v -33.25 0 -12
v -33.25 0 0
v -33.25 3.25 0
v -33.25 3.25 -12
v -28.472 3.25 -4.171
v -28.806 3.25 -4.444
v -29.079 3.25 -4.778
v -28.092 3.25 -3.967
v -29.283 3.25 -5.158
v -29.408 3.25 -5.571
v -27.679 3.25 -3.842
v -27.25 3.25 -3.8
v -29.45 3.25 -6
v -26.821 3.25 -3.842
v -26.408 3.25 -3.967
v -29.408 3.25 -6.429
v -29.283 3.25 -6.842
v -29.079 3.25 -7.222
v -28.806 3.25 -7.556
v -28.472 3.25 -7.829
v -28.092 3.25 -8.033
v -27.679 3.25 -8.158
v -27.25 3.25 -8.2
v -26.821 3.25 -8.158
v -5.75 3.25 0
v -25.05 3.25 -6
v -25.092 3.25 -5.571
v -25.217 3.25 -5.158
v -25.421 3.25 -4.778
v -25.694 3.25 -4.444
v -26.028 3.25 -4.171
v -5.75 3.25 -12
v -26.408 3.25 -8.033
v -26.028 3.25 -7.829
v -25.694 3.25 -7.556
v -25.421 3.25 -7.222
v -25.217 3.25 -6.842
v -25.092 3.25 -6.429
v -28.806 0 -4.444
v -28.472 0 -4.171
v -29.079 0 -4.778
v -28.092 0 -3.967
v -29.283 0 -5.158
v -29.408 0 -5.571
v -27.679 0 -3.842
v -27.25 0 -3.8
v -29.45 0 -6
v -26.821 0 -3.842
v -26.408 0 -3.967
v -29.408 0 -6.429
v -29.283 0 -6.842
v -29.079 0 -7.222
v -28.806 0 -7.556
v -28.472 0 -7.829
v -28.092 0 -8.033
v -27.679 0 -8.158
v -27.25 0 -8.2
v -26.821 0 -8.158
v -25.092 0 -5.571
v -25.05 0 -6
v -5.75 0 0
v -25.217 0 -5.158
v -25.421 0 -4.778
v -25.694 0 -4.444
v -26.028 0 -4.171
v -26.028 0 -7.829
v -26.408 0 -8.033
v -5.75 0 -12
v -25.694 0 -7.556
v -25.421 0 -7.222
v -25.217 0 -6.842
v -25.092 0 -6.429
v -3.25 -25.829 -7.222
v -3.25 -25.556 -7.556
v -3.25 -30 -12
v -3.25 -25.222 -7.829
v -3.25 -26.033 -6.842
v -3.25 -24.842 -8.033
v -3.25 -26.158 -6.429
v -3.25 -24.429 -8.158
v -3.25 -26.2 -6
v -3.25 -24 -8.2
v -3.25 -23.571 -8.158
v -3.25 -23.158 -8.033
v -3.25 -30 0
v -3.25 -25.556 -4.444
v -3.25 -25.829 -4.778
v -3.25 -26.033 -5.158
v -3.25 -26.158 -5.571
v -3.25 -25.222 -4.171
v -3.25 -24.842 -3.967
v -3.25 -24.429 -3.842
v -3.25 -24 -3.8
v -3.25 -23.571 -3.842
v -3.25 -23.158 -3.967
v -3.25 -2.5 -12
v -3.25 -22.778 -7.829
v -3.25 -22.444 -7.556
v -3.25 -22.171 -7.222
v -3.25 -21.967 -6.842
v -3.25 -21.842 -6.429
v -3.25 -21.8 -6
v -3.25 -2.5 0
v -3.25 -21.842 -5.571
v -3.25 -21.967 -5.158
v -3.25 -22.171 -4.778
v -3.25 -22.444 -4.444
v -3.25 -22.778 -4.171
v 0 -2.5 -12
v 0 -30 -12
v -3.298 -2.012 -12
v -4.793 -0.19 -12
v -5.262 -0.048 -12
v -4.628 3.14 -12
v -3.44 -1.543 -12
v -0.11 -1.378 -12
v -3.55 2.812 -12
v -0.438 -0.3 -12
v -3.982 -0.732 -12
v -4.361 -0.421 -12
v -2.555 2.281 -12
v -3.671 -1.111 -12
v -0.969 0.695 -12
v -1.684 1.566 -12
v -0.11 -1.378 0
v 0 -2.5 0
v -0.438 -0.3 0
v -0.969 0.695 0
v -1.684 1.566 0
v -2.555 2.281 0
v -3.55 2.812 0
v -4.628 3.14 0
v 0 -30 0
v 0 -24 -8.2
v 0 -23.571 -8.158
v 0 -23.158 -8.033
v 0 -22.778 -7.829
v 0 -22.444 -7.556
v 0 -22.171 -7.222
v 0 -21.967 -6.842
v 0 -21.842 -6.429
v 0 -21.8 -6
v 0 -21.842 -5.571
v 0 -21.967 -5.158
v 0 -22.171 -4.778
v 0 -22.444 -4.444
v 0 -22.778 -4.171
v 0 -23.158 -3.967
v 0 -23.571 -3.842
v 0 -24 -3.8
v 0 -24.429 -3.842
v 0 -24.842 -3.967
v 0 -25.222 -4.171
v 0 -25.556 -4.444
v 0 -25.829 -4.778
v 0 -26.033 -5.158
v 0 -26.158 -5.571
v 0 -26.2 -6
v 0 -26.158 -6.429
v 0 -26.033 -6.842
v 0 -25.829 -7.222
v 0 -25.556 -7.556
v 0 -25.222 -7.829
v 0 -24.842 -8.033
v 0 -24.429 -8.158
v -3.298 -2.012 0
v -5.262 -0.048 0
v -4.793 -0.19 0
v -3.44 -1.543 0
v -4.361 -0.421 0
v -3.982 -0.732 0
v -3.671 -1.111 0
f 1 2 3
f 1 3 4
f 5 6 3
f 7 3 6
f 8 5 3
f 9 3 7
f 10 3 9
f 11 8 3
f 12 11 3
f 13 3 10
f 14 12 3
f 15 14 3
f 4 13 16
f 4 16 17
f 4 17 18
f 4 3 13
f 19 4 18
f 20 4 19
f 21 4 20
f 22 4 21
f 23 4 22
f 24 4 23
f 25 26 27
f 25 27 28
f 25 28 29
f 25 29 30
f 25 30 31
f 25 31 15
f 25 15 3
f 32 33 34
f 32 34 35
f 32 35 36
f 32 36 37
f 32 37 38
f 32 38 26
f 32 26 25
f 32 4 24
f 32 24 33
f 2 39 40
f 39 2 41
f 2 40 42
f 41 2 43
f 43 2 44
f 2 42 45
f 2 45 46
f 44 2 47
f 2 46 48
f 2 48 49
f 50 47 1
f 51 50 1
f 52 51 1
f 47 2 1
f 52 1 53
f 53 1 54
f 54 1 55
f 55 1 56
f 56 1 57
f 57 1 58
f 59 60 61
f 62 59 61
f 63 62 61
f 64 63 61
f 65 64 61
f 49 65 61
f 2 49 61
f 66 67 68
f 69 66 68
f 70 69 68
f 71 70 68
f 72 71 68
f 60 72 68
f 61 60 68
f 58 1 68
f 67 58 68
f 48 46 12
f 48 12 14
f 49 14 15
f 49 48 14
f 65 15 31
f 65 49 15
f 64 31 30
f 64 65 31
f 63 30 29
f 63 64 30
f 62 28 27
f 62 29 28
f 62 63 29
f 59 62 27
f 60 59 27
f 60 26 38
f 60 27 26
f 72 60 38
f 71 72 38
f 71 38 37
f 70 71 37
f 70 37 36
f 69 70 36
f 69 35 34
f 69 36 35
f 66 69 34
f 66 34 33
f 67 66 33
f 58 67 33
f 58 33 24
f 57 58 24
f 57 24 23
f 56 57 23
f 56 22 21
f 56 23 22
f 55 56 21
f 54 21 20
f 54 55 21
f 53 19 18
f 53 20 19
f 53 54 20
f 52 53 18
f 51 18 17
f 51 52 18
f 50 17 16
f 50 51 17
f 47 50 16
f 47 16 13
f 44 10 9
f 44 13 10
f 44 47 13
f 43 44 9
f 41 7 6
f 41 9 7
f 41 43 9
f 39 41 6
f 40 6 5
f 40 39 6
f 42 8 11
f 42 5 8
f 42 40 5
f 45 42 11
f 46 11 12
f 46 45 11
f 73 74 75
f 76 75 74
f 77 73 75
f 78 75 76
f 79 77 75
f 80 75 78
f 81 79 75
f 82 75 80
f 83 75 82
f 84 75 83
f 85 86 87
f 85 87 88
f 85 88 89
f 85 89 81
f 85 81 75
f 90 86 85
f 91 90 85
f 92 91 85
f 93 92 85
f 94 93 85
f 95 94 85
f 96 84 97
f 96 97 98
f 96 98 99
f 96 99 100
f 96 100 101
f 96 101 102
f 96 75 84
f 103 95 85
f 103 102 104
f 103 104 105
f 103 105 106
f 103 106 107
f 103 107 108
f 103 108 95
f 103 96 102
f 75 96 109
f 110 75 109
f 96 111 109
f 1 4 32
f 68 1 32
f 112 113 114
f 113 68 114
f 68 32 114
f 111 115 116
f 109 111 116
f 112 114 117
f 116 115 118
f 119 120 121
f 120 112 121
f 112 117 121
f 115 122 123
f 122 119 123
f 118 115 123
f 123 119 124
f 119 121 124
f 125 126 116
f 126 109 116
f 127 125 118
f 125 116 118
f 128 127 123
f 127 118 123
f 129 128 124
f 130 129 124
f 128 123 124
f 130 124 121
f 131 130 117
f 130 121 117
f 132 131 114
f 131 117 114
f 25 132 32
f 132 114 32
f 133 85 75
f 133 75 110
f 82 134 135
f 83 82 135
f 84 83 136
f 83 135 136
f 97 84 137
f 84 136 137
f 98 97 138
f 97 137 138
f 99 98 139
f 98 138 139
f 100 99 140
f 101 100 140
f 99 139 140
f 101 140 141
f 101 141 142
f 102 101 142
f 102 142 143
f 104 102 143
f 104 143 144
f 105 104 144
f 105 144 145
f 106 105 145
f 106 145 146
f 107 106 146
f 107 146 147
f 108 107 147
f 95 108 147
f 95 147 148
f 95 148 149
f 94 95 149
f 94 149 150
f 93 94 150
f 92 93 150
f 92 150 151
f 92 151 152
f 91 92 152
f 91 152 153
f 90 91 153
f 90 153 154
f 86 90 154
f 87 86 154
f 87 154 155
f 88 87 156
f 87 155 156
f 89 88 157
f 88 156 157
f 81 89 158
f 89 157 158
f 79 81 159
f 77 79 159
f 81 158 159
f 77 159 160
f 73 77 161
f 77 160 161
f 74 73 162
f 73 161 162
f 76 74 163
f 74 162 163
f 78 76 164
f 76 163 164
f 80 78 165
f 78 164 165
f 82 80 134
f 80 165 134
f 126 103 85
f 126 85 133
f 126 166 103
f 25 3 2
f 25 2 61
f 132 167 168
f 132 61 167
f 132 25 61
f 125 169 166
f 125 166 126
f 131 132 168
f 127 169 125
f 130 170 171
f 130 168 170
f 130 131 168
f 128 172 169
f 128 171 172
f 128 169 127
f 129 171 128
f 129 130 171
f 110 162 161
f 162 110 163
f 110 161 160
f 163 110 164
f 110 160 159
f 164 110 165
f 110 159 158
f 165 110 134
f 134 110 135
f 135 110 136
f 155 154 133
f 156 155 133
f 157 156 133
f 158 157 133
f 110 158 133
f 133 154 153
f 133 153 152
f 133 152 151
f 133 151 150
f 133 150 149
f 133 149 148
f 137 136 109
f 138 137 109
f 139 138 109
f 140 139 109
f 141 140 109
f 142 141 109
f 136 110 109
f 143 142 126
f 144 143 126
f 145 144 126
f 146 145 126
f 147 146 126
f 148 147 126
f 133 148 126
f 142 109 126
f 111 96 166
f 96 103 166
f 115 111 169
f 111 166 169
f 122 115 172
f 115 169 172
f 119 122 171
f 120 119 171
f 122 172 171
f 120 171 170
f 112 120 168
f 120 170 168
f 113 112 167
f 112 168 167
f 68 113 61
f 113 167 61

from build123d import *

# Parameters (mm, degrees)
SKETCH1_W               = 33.25
SKETCH1_H               = 12
BOSS_EXTRUDE1_DEPTH     = 3.25
CUT_EXTRUDE1_DEPTH      = 36.498239393
CUT_EXTRUDE1_DEPTH_BACK = 36.498239393
SKETCH2_R               = 2.2
SKETCH3_W               = 3.25
SKETCH3_H               = 12
BOSS_EXTRUDE2_DEPTH     = 30
SKETCH4_R               = 2.2
CUT_EXTRUDE2_DEPTH      = 47.363374554
FILLET2_R               = 5.75
FILLET3_R               = 2.5


with BuildPart() as part:
    # Sketch1 → Boss-Extrude1 (new body)
    with BuildSketch(Plane(origin=(0, 0, 0), x_dir=(1, 0, 0), z_dir=(0, 1, 0))):
        with Locations((-16.625, 6)):
            Rectangle(SKETCH1_W, SKETCH1_H)
    extrude(amount=BOSS_EXTRUDE1_DEPTH)

    # Sketch2 → Cut-Extrude1 (cut, two sides: drawn at the far end of the back side and taken through both)
    with BuildSketch(Plane(origin=(0, 3.25, 0), x_dir=(1, 0, 0), z_dir=(0, 1, 0)).offset(-CUT_EXTRUDE1_DEPTH_BACK)):
        with Locations(Location((-27.25, 6, 0), (0, 0, 270))):
            Circle(SKETCH2_R)
    extrude(amount=CUT_EXTRUDE1_DEPTH + CUT_EXTRUDE1_DEPTH_BACK, mode=Mode.SUBTRACT)

    # Sketch3 → Boss-Extrude2 (add)
    with BuildSketch(Plane.XZ):
        with Locations((-1.625, -6)):
            Rectangle(SKETCH3_W, SKETCH3_H)
    extrude(amount=BOSS_EXTRUDE2_DEPTH)

    # Sketch4 → Cut-Extrude2 (cut, through all)
    with BuildSketch(Plane(origin=(0, 0, 0), x_dir=(0, 0, -1), z_dir=(1, 0, 0))):
        with Locations((6, -24)):
            Circle(SKETCH4_R)
    extrude(amount=-CUT_EXTRUDE2_DEPTH, mode=Mode.SUBTRACT)

    # Fillet2
    fillet2_edges = [part.edges().sort_by_distance(p)[0] for p in [
        (0, 3.25, -6),
    ]]
    fillet(fillet2_edges, radius=FILLET2_R)

    # Fillet3
    fillet3_edges = [part.edges().sort_by_distance(p)[0] for p in [
        (-3.25, 0, -6),
    ]]
    fillet(fillet3_edges, radius=FILLET3_R)


solid = part.part
